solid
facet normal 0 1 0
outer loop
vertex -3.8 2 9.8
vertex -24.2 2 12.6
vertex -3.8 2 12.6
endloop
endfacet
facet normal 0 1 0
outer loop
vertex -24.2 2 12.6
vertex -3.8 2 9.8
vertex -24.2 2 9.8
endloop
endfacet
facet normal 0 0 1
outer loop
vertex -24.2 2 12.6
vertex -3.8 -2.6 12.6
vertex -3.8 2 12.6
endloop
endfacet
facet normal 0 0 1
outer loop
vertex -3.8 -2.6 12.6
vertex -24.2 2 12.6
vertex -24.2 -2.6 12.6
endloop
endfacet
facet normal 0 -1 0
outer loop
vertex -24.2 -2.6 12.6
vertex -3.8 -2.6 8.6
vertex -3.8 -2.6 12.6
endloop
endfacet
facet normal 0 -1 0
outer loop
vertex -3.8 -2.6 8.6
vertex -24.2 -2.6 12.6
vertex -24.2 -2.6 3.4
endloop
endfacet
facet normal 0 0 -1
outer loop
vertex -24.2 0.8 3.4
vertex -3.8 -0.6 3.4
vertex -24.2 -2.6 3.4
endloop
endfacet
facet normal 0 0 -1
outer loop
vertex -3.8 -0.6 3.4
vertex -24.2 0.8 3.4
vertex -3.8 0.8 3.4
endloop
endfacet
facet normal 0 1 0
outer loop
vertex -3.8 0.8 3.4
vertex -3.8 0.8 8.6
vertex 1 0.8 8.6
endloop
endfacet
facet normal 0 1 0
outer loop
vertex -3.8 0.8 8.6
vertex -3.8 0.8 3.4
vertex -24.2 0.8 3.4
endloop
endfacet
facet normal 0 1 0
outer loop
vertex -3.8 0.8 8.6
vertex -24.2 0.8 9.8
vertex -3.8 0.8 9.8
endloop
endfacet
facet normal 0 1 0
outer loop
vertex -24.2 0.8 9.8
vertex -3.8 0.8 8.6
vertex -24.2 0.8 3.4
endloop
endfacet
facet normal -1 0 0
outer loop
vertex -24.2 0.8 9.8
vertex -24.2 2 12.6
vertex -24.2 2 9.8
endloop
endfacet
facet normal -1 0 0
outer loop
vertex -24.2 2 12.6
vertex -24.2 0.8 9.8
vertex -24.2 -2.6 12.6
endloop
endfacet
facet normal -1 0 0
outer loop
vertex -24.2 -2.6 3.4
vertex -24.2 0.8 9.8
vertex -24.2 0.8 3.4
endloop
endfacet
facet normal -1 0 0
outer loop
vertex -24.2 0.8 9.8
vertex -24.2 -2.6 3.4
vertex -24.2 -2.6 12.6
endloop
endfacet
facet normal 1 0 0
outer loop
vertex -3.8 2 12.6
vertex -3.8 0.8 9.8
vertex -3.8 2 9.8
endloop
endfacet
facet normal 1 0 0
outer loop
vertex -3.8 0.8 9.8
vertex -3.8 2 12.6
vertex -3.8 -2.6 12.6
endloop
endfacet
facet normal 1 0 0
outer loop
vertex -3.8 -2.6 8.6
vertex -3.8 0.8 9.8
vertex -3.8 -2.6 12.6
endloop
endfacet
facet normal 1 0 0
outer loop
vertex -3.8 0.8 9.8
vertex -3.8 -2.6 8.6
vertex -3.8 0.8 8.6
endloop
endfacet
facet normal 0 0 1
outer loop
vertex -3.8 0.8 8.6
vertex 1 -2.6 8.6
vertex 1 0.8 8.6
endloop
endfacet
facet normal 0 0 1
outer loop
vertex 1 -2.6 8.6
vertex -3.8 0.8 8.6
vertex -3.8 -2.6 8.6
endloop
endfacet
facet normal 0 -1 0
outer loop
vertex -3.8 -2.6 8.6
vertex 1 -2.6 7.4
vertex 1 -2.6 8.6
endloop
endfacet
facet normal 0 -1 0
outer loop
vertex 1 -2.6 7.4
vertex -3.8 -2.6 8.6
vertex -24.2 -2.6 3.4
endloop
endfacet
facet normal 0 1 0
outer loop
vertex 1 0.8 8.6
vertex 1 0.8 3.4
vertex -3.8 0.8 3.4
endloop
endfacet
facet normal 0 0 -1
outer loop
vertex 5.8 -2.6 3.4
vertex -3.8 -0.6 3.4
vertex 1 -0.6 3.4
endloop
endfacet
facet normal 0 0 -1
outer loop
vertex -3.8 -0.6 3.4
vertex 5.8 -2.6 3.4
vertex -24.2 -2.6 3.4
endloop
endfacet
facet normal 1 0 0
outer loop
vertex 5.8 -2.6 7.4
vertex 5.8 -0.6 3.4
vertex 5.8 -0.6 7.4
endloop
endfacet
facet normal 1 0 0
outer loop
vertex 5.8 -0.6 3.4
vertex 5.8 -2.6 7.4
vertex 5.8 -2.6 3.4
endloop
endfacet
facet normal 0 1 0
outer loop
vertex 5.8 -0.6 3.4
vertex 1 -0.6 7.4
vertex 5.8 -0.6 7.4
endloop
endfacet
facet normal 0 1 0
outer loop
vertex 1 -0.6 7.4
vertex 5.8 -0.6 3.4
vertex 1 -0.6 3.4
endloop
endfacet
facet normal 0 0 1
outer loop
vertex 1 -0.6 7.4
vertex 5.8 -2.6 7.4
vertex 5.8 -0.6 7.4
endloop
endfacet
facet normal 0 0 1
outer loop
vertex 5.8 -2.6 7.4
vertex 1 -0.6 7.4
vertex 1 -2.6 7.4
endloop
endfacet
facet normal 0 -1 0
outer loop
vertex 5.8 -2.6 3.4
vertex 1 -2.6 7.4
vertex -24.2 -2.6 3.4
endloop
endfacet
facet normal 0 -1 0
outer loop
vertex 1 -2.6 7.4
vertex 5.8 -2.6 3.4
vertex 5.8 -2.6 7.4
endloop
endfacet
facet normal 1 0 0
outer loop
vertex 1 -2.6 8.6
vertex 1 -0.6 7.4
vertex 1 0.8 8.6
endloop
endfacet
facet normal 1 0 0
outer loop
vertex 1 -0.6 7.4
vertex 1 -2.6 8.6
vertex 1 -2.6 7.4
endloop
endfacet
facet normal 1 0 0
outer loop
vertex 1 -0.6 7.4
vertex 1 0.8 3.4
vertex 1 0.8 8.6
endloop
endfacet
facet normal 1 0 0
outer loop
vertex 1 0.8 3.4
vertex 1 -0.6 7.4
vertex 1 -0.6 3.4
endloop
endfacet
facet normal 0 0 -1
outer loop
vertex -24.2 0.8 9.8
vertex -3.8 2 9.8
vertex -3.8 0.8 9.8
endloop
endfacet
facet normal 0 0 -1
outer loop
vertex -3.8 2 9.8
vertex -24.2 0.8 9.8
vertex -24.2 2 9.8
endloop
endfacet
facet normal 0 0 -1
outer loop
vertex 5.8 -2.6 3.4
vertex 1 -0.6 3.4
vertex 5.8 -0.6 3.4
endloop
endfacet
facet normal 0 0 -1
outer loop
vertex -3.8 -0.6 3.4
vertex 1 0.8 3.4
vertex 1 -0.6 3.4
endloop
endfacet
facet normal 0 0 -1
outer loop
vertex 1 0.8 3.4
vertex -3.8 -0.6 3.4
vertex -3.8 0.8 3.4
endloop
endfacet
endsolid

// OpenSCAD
// file: ../p/rect3.scad
use <../lib.scad>
function ldraw_lib__rect3() = [
// 0 Rectangle with 3 Edges
// 0 Name: rect3.dat
// 0 Author: Mark Kennedy [mkennedy]
// 0 !LDRAW_ORG Primitive UPDATE 2010-01
// 0 !LICENSE Licensed under CC BY 2.0 and CC BY 4.0 : see CAreadme.txt
// 
// 0 BFC CERTIFY CCW
  [0,"BFC","CERTIFY"],
  [0,"BFC","CCW"],
// 
// 0 !HISTORY 2003-08-01 [PTadmin] Official Update 2003-02
// 0 !HISTORY 2007-06-24 [PTadmin] Header formatted for Contributor Agreement
// 0 !HISTORY 2008-07-01 [PTadmin] Official Update 2008-01
// 0 !HISTORY 2010-01-17 [mikeheide] Change winding to CCW
// 0 !HISTORY 2010-04-05 [PTadmin] Official Update 2010-01
// 
// 
// 2 24 1 0 1 -1 0 1
  [2,24,1,0,1,-1,0,1],
// 2 24 1 0 1 1 0 -1
  [2,24,1,0,1,1,0,-1],
// 2 24 -1 0 1 -1 0 -1
  [2,24,-1,0,1,-1,0,-1],
// 4 16 -1 0 1 -1 0 -1 1 0 -1 1 0 1
  [4,16,-1,0,1,-1,0,-1,1,0,-1,1,0,1],
// 0 //
];
module ldraw_lib__rect3(step=0, col=false, unit=2/5, alt=false, line=0.2, solid=!$preview)
    makepoly(ldraw_lib__rect3(), step=step, col=col, unit=unit, alt=alt, line=line, solid=solid);
ldraw_lib__rect3(line=0.2);
// file: ../p/rect.scad
use <../lib.scad>
function ldraw_lib__rect() = [
// 0 Rectangle
// 0 Name: rect.dat
// 0 Author: James Jessiman
// 0 !LDRAW_ORG Primitive UPDATE 2010-01
// 0 !LICENSE Licensed under CC BY 2.0 and CC BY 4.0 : see CAreadme.txt
// 
// 0 BFC CERTIFY CCW
  [0,"BFC","CERTIFY"],
  [0,"BFC","CCW"],
// 
// 0 !HISTORY 2002-04-05 [hafhead] Added BFC statement
// 0 !HISTORY 2002-04-25 [PTadmin] Official Update 2002-02
// 0 !HISTORY 2007-06-24 [PTadmin] Header formatted for Contributor Agreement
// 0 !HISTORY 2008-07-01 [PTadmin] Official Update 2008-01
// 0 !HISTORY 2010-01-17 [mikeheide] changed winding to CCW
// 0 !HISTORY 2010-04-05 [PTadmin] Official Update 2010-01
// 
// 
// 2 24 1 0 1 -1 0 1
  [2,24,1,0,1,-1,0,1],
// 2 24 -1 0 1 -1 0 -1
  [2,24,-1,0,1,-1,0,-1],
// 2 24 -1 0 -1 1 0 -1
  [2,24,-1,0,-1,1,0,-1],
// 2 24 1 0 -1 1 0 1
  [2,24,1,0,-1,1,0,1],
// 4 16 -1 0 1 -1 0 -1 1 0 -1 1 0 1
  [4,16,-1,0,1,-1,0,-1,1,0,-1,1,0,1],
// 0
];
module ldraw_lib__rect(step=0, col=false, unit=2/5, alt=false, line=0.2, solid=!$preview)
    makepoly(ldraw_lib__rect(), step=step, col=col, unit=unit, alt=alt, line=line, solid=solid);
ldraw_lib__rect(line=0.2);
// file: ../p/box3-3.scad
use <../lib.scad>
function ldraw_lib__box3_3() = [
// 0 Box with 3 Adjacent Faces and 3 Missing Edges
// 0 Name: box3-3.dat
// 0 Author: Mark Kennedy [mkennedy]
// 0 !LDRAW_ORG Primitive UPDATE 2004-03
// 0 !LICENSE Licensed under CC BY 2.0 and CC BY 4.0 : see CAreadme.txt
// 
// 0 BFC CERTIFY CCW
  [0,"BFC","CERTIFY"],
  [0,"BFC","CCW"],
// 
// 0 !HISTORY 2004-09-15 [PTadmin] Official Update 2004-03
// 0 !HISTORY 2007-06-24 [PTadmin] Header formatted for Contributor Agreement
// 0 !HISTORY 2008-07-01 [PTadmin] Official Update 2008-01
// 
// 
// 2 24 1 1 1 -1 1 1
  [2,24,1,1,1,-1,1,1],
// 2 24 -1 1 1 -1 1 -1
  [2,24,-1,1,1,-1,1,-1],
// 2 24 -1 1 -1 1 1 -1
  [2,24,-1,1,-1,1,1,-1],
// 2 24 1 1 -1 1 1 1
  [2,24,1,1,-1,1,1,1],
// 2 24 1 -1 1 -1 -1 1
  [2,24,1,-1,1,-1,-1,1],
// 2 24 1 -1 -1 1 -1 1
  [2,24,1,-1,-1,1,-1,1],
// 2 24 1 -1 1 1 1 1
  [2,24,1,-1,1,1,1,1],
// 2 24 -1 -1 1 -1 1 1
  [2,24,-1,-1,1,-1,1,1],
// 2 24 1 -1 -1 1 1 -1
  [2,24,1,-1,-1,1,1,-1],
// 0
// 4 16 1 1 1 1 1 -1 -1 1 -1 -1 1 1
  [4,16,1,1,1,1,1,-1,-1,1,-1,-1,1,1],
// 4 16 1 1 1 1 -1 1 1 -1 -1 1 1 -1
  [4,16,1,1,1,1,-1,1,1,-1,-1,1,1,-1],
// 4 16 1 1 1 -1 1 1 -1 -1 1 1 -1 1
  [4,16,1,1,1,-1,1,1,-1,-1,1,1,-1,1],
// 0
// 
];
module ldraw_lib__box3_3(step=0, col=false, unit=2/5, alt=false, line=0.2, solid=!$preview)
    makepoly(ldraw_lib__box3_3(), step=step, col=col, unit=unit, alt=alt, line=line, solid=solid);
ldraw_lib__box3_3(line=0.2);
// file: ../p/box2-5.scad
use <../lib.scad>
function ldraw_lib__box2_5() = [
// 0 Box with 2 Faces without 5 Edges
// 0 Name: box2-5.dat
// 0 Author: Steffen [Steffen]
// 0 !LDRAW_ORG Primitive UPDATE 2003-03
// 0 !LICENSE Licensed under CC BY 2.0 and CC BY 4.0 : see CAreadme.txt
// 
// 0 BFC CERTIFY CCW
  [0,"BFC","CERTIFY"],
  [0,"BFC","CCW"],
// 
// 0 !HISTORY 2003-12-19 [PTadmin] Official Update 2003-03
// 0 !HISTORY 2007-06-24 [PTadmin] Header formatted for Contributor Agreement
// 0 !HISTORY 2008-07-01 [PTadmin] Official Update 2008-01
// 
// 
// 2 24 1 1 1 -1 1 1
  [2,24,1,1,1,-1,1,1],
// 2 24 1 1 -1 -1 1 -1
  [2,24,1,1,-1,-1,1,-1],
// 2 24 1 -1 1 -1 -1 1
  [2,24,1,-1,1,-1,-1,1],
// 2 24 -1 -1 1 -1 1 1
  [2,24,-1,-1,1,-1,1,1],
// 2 24 1 -1 1 1 1 1
  [2,24,1,-1,1,1,1,1],
// 2 24 -1 1 -1 -1 1 1
  [2,24,-1,1,-1,-1,1,1],
// 2 24 1 1 -1 1 1 1
  [2,24,1,1,-1,1,1,1],
// 4 16 1 1 1 1 1 -1 -1 1 -1 -1 1 1
  [4,16,1,1,1,1,1,-1,-1,1,-1,-1,1,1],
// 4 16 1 1 1 -1 1 1 -1 -1 1 1 -1 1
  [4,16,1,1,1,-1,1,1,-1,-1,1,1,-1,1],
// 0
];
module ldraw_lib__box2_5(step=0, col=false, unit=2/5, alt=false, line=0.2, solid=!$preview)
    makepoly(ldraw_lib__box2_5(), step=step, col=col, unit=unit, alt=alt, line=line, solid=solid);
ldraw_lib__box2_5(line=0.2);
// file: s/822s02.scad
use <../../lib.scad>
use <../../p/box2-5.scad>
use <../../p/box3-3.scad>
use <../../p/rect.scad>
use <../../p/rect3.scad>
function ldraw_lib__s__822s02() = [
// 0 ~Garage Door Counterweight without Hinge Pin
// 0 Name: s\822s02.dat
// 0 Author: J.C. Tchang [tchang]
// 0 !LDRAW_ORG Subpart UPDATE 2020-03
// 0 !LICENSE Licensed under CC BY 2.0 and CC BY 4.0 : see CAreadme.txt
// 
// 0 BFC CERTIFY CCW
  [0,"BFC","CERTIFY"],
  [0,"BFC","CCW"],
// 
// 0 !HISTORY 2010-01-17 [mikeheide] substituted stud.dat with 4-4cylc.dat, updated header
// 0 !HISTORY 2011-05-14 [Steffen] restructured files 822.dat, 823.dat
// 0 !HISTORY 2017-12-23 [MagFors] removed hingepin
// 0 !HISTORY 2020-12-29 [PTadmin] Official Update 2020-03
// 
// 
// 2 24 14.5 -8.5 -6.5 -60.5 -8.5 -6.5
  [2,24,14.5,-8.5,-6.5,-60.5,-8.5,-6.5],
// 2 24 2.5 -18.5 -6.5 2.5 -21.5 -6.5
  [2,24,2.5,-18.5,-6.5,2.5,-21.5,-6.5],
// 2 24 2.5 -21.5 2 2.5 -8.5 2
  [2,24,2.5,-21.5,2,2.5,-8.5,2],
// 2 24 -9.5 -21.5 -6.5 -9.5 -31.5 -6.5
  [2,24,-9.5,-21.5,-6.5,-9.5,-31.5,-6.5],
// 2 24 -9.5 -21.5 2 -9.5 -24.5 2
  [2,24,-9.5,-21.5,2,-9.5,-24.5,2],
// 2 24 -9.5 -8.5 2 -60.5 -8.5 2
  [2,24,-9.5,-8.5,2,-60.5,-8.5,2],
// 2 24 -60.5 -31.5 -6.5 -60.5 -8.5 -6.5
  [2,24,-60.5,-31.5,-6.5,-60.5,-8.5,-6.5],
// 2 24 -60.5 -24.5 2 -60.5 -8.5 2
  [2,24,-60.5,-24.5,2,-60.5,-8.5,2],
// 2 24 -60.5 -8.5 2 -60.5 -8.5 -6.5
  [2,24,-60.5,-8.5,2,-60.5,-8.5,-6.5],
// 1 16 -35 -28 -0.75 -25.5 0 0 0 0 -3.5 0 5.75 0 box2-5.dat
  [1,16,-35,-28,-0.75,-25.5,0,0,0,0,-3.5,0,5.75,0, ldraw_lib__box2_5()],
// 4 16 -9.5 -21.5 -6.5 -9.5 -31.5 -6.5 -60.5 -31.5 -6.5 -60.5 -8.5 -6.5
  [4,16,-9.5,-21.5,-6.5,-9.5,-31.5,-6.5,-60.5,-31.5,-6.5,-60.5,-8.5,-6.5],
// 4 16 -60.5 -8.5 2 -9.5 -8.5 2 -9.5 -8.5 -1.5 -60.5 -8.5 -6.5
  [4,16,-60.5,-8.5,2,-9.5,-8.5,2,-9.5,-8.5,-1.5,-60.5,-8.5,-6.5],
// 4 16 2.5 -21.5 2 -9.5 -8.5 2 -60.5 -8.5 2 -9.5 -21.5 2
  [4,16,2.5,-21.5,2,-9.5,-8.5,2,-60.5,-8.5,2,-9.5,-21.5,2],
// 4 16 -60.5 -8.5 2 -60.5 -24.5 2 -9.5 -24.5 2 -9.5 -21.5 2
  [4,16,-60.5,-8.5,2,-60.5,-24.5,2,-9.5,-24.5,2,-9.5,-21.5,2],
// 4 16 -60.5 -31.5 -6.5 -60.5 -31.5 5 -60.5 -24.5 5 -60.5 -24.5 2
  [4,16,-60.5,-31.5,-6.5,-60.5,-31.5,5,-60.5,-24.5,5,-60.5,-24.5,2],
// 4 16 -60.5 -8.5 -6.5 -60.5 -31.5 -6.5 -60.5 -24.5 2 -60.5 -8.5 2
  [4,16,-60.5,-8.5,-6.5,-60.5,-31.5,-6.5,-60.5,-24.5,2,-60.5,-8.5,2],
// 4 16 -9.5 -24.5 2 -9.5 -24.5 5 -9.5 -31.5 5 -9.5 -31.5 -6.5
  [4,16,-9.5,-24.5,2,-9.5,-24.5,5,-9.5,-31.5,5,-9.5,-31.5,-6.5],
// 4 16 -9.5 -21.5 2 -9.5 -24.5 2 -9.5 -31.5 -6.5 -9.5 -21.5 -6.5
  [4,16,-9.5,-21.5,2,-9.5,-24.5,2,-9.5,-31.5,-6.5,-9.5,-21.5,-6.5],
// 1 16 -3.5 -21.5 -2.25 -6 0 0 0 1 0 0 0 -4.25 rect.dat
  [1,16,-3.5,-21.5,-2.25,-6,0,0,0,1,0,0,0,-4.25, ldraw_lib__rect()],
// 4 16 2.5 -18.5 -6.5 2.5 -21.5 -6.5 -9.5 -21.5 -6.5 -60.5 -8.5 -6.5
  [4,16,2.5,-18.5,-6.5,2.5,-21.5,-6.5,-9.5,-21.5,-6.5,-60.5,-8.5,-6.5],
// 3 16 2.5 -21.5 2 2.5 -8.5 2 -9.5 -8.5 2
  [3,16,2.5,-21.5,2,2.5,-8.5,2,-9.5,-8.5,2],
// 4 16 -9.5 -8.5 -1.5 2.5 -8.5 -1.5 14.5 -8.5 -6.5 -60.5 -8.5 -6.5
  [4,16,-9.5,-8.5,-1.5,2.5,-8.5,-1.5,14.5,-8.5,-6.5,-60.5,-8.5,-6.5],
// 1 16 8.5 -13.5 -4 0 6 0 0 0 -5 2.5 0 0 box3-3.dat
  [1,16,8.5,-13.5,-4,0,6,0,0,0,-5,2.5,0,0, ldraw_lib__box3_3()],
// 4 16 14.5 -8.5 -6.5 14.5 -18.5 -6.5 2.5 -18.5 -6.5 -60.5 -8.5 -6.5
  [4,16,14.5,-8.5,-6.5,14.5,-18.5,-6.5,2.5,-18.5,-6.5,-60.5,-8.5,-6.5],
// 4 16 2.5 -18.5 -6.5 2.5 -18.5 -1.5 2.5 -21.5 2 2.5 -21.5 -6.5
  [4,16,2.5,-18.5,-6.5,2.5,-18.5,-1.5,2.5,-21.5,2,2.5,-21.5,-6.5],
// 4 16 2.5 -8.5 -1.5 2.5 -8.5 2 2.5 -21.5 2 2.5 -18.5 -1.5
  [4,16,2.5,-8.5,-1.5,2.5,-8.5,2,2.5,-21.5,2,2.5,-18.5,-1.5],
// 1 16 -35 -24.5 3.5 25.5 0 0 0 -1 0 0 0 -1.5 rect3.dat
  [1,16,-35,-24.5,3.5,25.5,0,0,0,-1,0,0,0,-1.5, ldraw_lib__rect3()],
// 3 16 14.5 -8.5 -6.5 2.5 -8.5 -1.5 14.5 -8.5 -1.5
  [3,16,14.5,-8.5,-6.5,2.5,-8.5,-1.5,14.5,-8.5,-1.5],
];
module ldraw_lib__s__822s02(step=0, col=false, unit=2/5, alt=false, line=0.2, solid=!$preview)
    makepoly(ldraw_lib__s__822s02(), step=step, col=col, unit=unit, alt=alt, line=line, solid=solid);
ldraw_lib__s__822s02(line=0.2);
// file: ../p/rect2a.scad
use <../lib.scad>
function ldraw_lib__rect2a() = [
// 0 Rectangle with 2 Adjacent Edges
// 0 Name: rect2a.dat
// 0 Author: Chris Dee [cwdee]
// 0 !LDRAW_ORG Primitive UPDATE 2010-01
// 0 !LICENSE Licensed under CC BY 2.0 and CC BY 4.0 : see CAreadme.txt
// 
// 0 BFC CERTIFY CCW
  [0,"BFC","CERTIFY"],
  [0,"BFC","CCW"],
// 
// 0 !HISTORY 2003-12-19 [PTadmin] Official Update 2003-03
// 0 !HISTORY 2007-06-24 [PTadmin] Header formatted for Contributor Agreement
// 0 !HISTORY 2008-07-01 [PTadmin] Official Update 2008-01
// 0 !HISTORY 2010-01-17 [mikeheide] changed winding to CCW
// 0 !HISTORY 2010-04-05 [PTadmin] Official Update 2010-01
// 
// 
// 2 24 1 0 1 -1 0 1
  [2,24,1,0,1,-1,0,1],
// 2 24 1 0 -1 1 0 1
  [2,24,1,0,-1,1,0,1],
// 4 16 -1 0 1 -1 0 -1 1 0 -1 1 0 1
  [4,16,-1,0,1,-1,0,-1,1,0,-1,1,0,1],
// 0
];
module ldraw_lib__rect2a(step=0, col=false, unit=2/5, alt=false, line=0.2, solid=!$preview)
    makepoly(ldraw_lib__rect2a(), step=step, col=col, unit=unit, alt=alt, line=line, solid=solid);
ldraw_lib__rect2a(line=0.2);
// main file
use <../lib.scad>
use <../p/rect2a.scad>
use <s/822s02.scad>
function ldraw_lib__u9187c() = [
// 0 ~Garage Door Counterweight Right without Hinge Pin
// 0 Name: u9187c.dat
// 0 Author: Magnus Forsberg [MagFors]
// 0 !LDRAW_ORG Part UPDATE 2020-03
// 0 !LICENSE Licensed under CC BY 2.0 and CC BY 4.0 : see CAreadme.txt
// 
// 0 BFC CERTIFY CCW
  [0,"BFC","CERTIFY"],
  [0,"BFC","CCW"],
// 
// 0 !HISTORY 2020-12-29 [PTadmin] Official Update 2020-03
// 
// 
// 1 16 0 0 0 1 0 0 0 1 0 0 0 1 s\822s02.dat
  [1,16,0,0,0,1,0,0,0,1,0,0,0,1, ldraw_lib__s__822s02()],
// 1 16 -3.5 -8.5 .25 0 0 6 0 -1 0 1.75 0 0 rect2a.dat
  [1,16,-3.5,-8.5,.25,0,0,6,0,-1,0,1.75,0,0, ldraw_lib__rect2a()],
];
module ldraw_lib__u9187c(step=0, col=false, unit=2/5, alt=false, line=0.2, solid=!$preview)
    makepoly(ldraw_lib__u9187c(), step=step, col=col, unit=unit, alt=alt, line=line, solid=solid);
ldraw_lib__u9187c(line=0.2);
